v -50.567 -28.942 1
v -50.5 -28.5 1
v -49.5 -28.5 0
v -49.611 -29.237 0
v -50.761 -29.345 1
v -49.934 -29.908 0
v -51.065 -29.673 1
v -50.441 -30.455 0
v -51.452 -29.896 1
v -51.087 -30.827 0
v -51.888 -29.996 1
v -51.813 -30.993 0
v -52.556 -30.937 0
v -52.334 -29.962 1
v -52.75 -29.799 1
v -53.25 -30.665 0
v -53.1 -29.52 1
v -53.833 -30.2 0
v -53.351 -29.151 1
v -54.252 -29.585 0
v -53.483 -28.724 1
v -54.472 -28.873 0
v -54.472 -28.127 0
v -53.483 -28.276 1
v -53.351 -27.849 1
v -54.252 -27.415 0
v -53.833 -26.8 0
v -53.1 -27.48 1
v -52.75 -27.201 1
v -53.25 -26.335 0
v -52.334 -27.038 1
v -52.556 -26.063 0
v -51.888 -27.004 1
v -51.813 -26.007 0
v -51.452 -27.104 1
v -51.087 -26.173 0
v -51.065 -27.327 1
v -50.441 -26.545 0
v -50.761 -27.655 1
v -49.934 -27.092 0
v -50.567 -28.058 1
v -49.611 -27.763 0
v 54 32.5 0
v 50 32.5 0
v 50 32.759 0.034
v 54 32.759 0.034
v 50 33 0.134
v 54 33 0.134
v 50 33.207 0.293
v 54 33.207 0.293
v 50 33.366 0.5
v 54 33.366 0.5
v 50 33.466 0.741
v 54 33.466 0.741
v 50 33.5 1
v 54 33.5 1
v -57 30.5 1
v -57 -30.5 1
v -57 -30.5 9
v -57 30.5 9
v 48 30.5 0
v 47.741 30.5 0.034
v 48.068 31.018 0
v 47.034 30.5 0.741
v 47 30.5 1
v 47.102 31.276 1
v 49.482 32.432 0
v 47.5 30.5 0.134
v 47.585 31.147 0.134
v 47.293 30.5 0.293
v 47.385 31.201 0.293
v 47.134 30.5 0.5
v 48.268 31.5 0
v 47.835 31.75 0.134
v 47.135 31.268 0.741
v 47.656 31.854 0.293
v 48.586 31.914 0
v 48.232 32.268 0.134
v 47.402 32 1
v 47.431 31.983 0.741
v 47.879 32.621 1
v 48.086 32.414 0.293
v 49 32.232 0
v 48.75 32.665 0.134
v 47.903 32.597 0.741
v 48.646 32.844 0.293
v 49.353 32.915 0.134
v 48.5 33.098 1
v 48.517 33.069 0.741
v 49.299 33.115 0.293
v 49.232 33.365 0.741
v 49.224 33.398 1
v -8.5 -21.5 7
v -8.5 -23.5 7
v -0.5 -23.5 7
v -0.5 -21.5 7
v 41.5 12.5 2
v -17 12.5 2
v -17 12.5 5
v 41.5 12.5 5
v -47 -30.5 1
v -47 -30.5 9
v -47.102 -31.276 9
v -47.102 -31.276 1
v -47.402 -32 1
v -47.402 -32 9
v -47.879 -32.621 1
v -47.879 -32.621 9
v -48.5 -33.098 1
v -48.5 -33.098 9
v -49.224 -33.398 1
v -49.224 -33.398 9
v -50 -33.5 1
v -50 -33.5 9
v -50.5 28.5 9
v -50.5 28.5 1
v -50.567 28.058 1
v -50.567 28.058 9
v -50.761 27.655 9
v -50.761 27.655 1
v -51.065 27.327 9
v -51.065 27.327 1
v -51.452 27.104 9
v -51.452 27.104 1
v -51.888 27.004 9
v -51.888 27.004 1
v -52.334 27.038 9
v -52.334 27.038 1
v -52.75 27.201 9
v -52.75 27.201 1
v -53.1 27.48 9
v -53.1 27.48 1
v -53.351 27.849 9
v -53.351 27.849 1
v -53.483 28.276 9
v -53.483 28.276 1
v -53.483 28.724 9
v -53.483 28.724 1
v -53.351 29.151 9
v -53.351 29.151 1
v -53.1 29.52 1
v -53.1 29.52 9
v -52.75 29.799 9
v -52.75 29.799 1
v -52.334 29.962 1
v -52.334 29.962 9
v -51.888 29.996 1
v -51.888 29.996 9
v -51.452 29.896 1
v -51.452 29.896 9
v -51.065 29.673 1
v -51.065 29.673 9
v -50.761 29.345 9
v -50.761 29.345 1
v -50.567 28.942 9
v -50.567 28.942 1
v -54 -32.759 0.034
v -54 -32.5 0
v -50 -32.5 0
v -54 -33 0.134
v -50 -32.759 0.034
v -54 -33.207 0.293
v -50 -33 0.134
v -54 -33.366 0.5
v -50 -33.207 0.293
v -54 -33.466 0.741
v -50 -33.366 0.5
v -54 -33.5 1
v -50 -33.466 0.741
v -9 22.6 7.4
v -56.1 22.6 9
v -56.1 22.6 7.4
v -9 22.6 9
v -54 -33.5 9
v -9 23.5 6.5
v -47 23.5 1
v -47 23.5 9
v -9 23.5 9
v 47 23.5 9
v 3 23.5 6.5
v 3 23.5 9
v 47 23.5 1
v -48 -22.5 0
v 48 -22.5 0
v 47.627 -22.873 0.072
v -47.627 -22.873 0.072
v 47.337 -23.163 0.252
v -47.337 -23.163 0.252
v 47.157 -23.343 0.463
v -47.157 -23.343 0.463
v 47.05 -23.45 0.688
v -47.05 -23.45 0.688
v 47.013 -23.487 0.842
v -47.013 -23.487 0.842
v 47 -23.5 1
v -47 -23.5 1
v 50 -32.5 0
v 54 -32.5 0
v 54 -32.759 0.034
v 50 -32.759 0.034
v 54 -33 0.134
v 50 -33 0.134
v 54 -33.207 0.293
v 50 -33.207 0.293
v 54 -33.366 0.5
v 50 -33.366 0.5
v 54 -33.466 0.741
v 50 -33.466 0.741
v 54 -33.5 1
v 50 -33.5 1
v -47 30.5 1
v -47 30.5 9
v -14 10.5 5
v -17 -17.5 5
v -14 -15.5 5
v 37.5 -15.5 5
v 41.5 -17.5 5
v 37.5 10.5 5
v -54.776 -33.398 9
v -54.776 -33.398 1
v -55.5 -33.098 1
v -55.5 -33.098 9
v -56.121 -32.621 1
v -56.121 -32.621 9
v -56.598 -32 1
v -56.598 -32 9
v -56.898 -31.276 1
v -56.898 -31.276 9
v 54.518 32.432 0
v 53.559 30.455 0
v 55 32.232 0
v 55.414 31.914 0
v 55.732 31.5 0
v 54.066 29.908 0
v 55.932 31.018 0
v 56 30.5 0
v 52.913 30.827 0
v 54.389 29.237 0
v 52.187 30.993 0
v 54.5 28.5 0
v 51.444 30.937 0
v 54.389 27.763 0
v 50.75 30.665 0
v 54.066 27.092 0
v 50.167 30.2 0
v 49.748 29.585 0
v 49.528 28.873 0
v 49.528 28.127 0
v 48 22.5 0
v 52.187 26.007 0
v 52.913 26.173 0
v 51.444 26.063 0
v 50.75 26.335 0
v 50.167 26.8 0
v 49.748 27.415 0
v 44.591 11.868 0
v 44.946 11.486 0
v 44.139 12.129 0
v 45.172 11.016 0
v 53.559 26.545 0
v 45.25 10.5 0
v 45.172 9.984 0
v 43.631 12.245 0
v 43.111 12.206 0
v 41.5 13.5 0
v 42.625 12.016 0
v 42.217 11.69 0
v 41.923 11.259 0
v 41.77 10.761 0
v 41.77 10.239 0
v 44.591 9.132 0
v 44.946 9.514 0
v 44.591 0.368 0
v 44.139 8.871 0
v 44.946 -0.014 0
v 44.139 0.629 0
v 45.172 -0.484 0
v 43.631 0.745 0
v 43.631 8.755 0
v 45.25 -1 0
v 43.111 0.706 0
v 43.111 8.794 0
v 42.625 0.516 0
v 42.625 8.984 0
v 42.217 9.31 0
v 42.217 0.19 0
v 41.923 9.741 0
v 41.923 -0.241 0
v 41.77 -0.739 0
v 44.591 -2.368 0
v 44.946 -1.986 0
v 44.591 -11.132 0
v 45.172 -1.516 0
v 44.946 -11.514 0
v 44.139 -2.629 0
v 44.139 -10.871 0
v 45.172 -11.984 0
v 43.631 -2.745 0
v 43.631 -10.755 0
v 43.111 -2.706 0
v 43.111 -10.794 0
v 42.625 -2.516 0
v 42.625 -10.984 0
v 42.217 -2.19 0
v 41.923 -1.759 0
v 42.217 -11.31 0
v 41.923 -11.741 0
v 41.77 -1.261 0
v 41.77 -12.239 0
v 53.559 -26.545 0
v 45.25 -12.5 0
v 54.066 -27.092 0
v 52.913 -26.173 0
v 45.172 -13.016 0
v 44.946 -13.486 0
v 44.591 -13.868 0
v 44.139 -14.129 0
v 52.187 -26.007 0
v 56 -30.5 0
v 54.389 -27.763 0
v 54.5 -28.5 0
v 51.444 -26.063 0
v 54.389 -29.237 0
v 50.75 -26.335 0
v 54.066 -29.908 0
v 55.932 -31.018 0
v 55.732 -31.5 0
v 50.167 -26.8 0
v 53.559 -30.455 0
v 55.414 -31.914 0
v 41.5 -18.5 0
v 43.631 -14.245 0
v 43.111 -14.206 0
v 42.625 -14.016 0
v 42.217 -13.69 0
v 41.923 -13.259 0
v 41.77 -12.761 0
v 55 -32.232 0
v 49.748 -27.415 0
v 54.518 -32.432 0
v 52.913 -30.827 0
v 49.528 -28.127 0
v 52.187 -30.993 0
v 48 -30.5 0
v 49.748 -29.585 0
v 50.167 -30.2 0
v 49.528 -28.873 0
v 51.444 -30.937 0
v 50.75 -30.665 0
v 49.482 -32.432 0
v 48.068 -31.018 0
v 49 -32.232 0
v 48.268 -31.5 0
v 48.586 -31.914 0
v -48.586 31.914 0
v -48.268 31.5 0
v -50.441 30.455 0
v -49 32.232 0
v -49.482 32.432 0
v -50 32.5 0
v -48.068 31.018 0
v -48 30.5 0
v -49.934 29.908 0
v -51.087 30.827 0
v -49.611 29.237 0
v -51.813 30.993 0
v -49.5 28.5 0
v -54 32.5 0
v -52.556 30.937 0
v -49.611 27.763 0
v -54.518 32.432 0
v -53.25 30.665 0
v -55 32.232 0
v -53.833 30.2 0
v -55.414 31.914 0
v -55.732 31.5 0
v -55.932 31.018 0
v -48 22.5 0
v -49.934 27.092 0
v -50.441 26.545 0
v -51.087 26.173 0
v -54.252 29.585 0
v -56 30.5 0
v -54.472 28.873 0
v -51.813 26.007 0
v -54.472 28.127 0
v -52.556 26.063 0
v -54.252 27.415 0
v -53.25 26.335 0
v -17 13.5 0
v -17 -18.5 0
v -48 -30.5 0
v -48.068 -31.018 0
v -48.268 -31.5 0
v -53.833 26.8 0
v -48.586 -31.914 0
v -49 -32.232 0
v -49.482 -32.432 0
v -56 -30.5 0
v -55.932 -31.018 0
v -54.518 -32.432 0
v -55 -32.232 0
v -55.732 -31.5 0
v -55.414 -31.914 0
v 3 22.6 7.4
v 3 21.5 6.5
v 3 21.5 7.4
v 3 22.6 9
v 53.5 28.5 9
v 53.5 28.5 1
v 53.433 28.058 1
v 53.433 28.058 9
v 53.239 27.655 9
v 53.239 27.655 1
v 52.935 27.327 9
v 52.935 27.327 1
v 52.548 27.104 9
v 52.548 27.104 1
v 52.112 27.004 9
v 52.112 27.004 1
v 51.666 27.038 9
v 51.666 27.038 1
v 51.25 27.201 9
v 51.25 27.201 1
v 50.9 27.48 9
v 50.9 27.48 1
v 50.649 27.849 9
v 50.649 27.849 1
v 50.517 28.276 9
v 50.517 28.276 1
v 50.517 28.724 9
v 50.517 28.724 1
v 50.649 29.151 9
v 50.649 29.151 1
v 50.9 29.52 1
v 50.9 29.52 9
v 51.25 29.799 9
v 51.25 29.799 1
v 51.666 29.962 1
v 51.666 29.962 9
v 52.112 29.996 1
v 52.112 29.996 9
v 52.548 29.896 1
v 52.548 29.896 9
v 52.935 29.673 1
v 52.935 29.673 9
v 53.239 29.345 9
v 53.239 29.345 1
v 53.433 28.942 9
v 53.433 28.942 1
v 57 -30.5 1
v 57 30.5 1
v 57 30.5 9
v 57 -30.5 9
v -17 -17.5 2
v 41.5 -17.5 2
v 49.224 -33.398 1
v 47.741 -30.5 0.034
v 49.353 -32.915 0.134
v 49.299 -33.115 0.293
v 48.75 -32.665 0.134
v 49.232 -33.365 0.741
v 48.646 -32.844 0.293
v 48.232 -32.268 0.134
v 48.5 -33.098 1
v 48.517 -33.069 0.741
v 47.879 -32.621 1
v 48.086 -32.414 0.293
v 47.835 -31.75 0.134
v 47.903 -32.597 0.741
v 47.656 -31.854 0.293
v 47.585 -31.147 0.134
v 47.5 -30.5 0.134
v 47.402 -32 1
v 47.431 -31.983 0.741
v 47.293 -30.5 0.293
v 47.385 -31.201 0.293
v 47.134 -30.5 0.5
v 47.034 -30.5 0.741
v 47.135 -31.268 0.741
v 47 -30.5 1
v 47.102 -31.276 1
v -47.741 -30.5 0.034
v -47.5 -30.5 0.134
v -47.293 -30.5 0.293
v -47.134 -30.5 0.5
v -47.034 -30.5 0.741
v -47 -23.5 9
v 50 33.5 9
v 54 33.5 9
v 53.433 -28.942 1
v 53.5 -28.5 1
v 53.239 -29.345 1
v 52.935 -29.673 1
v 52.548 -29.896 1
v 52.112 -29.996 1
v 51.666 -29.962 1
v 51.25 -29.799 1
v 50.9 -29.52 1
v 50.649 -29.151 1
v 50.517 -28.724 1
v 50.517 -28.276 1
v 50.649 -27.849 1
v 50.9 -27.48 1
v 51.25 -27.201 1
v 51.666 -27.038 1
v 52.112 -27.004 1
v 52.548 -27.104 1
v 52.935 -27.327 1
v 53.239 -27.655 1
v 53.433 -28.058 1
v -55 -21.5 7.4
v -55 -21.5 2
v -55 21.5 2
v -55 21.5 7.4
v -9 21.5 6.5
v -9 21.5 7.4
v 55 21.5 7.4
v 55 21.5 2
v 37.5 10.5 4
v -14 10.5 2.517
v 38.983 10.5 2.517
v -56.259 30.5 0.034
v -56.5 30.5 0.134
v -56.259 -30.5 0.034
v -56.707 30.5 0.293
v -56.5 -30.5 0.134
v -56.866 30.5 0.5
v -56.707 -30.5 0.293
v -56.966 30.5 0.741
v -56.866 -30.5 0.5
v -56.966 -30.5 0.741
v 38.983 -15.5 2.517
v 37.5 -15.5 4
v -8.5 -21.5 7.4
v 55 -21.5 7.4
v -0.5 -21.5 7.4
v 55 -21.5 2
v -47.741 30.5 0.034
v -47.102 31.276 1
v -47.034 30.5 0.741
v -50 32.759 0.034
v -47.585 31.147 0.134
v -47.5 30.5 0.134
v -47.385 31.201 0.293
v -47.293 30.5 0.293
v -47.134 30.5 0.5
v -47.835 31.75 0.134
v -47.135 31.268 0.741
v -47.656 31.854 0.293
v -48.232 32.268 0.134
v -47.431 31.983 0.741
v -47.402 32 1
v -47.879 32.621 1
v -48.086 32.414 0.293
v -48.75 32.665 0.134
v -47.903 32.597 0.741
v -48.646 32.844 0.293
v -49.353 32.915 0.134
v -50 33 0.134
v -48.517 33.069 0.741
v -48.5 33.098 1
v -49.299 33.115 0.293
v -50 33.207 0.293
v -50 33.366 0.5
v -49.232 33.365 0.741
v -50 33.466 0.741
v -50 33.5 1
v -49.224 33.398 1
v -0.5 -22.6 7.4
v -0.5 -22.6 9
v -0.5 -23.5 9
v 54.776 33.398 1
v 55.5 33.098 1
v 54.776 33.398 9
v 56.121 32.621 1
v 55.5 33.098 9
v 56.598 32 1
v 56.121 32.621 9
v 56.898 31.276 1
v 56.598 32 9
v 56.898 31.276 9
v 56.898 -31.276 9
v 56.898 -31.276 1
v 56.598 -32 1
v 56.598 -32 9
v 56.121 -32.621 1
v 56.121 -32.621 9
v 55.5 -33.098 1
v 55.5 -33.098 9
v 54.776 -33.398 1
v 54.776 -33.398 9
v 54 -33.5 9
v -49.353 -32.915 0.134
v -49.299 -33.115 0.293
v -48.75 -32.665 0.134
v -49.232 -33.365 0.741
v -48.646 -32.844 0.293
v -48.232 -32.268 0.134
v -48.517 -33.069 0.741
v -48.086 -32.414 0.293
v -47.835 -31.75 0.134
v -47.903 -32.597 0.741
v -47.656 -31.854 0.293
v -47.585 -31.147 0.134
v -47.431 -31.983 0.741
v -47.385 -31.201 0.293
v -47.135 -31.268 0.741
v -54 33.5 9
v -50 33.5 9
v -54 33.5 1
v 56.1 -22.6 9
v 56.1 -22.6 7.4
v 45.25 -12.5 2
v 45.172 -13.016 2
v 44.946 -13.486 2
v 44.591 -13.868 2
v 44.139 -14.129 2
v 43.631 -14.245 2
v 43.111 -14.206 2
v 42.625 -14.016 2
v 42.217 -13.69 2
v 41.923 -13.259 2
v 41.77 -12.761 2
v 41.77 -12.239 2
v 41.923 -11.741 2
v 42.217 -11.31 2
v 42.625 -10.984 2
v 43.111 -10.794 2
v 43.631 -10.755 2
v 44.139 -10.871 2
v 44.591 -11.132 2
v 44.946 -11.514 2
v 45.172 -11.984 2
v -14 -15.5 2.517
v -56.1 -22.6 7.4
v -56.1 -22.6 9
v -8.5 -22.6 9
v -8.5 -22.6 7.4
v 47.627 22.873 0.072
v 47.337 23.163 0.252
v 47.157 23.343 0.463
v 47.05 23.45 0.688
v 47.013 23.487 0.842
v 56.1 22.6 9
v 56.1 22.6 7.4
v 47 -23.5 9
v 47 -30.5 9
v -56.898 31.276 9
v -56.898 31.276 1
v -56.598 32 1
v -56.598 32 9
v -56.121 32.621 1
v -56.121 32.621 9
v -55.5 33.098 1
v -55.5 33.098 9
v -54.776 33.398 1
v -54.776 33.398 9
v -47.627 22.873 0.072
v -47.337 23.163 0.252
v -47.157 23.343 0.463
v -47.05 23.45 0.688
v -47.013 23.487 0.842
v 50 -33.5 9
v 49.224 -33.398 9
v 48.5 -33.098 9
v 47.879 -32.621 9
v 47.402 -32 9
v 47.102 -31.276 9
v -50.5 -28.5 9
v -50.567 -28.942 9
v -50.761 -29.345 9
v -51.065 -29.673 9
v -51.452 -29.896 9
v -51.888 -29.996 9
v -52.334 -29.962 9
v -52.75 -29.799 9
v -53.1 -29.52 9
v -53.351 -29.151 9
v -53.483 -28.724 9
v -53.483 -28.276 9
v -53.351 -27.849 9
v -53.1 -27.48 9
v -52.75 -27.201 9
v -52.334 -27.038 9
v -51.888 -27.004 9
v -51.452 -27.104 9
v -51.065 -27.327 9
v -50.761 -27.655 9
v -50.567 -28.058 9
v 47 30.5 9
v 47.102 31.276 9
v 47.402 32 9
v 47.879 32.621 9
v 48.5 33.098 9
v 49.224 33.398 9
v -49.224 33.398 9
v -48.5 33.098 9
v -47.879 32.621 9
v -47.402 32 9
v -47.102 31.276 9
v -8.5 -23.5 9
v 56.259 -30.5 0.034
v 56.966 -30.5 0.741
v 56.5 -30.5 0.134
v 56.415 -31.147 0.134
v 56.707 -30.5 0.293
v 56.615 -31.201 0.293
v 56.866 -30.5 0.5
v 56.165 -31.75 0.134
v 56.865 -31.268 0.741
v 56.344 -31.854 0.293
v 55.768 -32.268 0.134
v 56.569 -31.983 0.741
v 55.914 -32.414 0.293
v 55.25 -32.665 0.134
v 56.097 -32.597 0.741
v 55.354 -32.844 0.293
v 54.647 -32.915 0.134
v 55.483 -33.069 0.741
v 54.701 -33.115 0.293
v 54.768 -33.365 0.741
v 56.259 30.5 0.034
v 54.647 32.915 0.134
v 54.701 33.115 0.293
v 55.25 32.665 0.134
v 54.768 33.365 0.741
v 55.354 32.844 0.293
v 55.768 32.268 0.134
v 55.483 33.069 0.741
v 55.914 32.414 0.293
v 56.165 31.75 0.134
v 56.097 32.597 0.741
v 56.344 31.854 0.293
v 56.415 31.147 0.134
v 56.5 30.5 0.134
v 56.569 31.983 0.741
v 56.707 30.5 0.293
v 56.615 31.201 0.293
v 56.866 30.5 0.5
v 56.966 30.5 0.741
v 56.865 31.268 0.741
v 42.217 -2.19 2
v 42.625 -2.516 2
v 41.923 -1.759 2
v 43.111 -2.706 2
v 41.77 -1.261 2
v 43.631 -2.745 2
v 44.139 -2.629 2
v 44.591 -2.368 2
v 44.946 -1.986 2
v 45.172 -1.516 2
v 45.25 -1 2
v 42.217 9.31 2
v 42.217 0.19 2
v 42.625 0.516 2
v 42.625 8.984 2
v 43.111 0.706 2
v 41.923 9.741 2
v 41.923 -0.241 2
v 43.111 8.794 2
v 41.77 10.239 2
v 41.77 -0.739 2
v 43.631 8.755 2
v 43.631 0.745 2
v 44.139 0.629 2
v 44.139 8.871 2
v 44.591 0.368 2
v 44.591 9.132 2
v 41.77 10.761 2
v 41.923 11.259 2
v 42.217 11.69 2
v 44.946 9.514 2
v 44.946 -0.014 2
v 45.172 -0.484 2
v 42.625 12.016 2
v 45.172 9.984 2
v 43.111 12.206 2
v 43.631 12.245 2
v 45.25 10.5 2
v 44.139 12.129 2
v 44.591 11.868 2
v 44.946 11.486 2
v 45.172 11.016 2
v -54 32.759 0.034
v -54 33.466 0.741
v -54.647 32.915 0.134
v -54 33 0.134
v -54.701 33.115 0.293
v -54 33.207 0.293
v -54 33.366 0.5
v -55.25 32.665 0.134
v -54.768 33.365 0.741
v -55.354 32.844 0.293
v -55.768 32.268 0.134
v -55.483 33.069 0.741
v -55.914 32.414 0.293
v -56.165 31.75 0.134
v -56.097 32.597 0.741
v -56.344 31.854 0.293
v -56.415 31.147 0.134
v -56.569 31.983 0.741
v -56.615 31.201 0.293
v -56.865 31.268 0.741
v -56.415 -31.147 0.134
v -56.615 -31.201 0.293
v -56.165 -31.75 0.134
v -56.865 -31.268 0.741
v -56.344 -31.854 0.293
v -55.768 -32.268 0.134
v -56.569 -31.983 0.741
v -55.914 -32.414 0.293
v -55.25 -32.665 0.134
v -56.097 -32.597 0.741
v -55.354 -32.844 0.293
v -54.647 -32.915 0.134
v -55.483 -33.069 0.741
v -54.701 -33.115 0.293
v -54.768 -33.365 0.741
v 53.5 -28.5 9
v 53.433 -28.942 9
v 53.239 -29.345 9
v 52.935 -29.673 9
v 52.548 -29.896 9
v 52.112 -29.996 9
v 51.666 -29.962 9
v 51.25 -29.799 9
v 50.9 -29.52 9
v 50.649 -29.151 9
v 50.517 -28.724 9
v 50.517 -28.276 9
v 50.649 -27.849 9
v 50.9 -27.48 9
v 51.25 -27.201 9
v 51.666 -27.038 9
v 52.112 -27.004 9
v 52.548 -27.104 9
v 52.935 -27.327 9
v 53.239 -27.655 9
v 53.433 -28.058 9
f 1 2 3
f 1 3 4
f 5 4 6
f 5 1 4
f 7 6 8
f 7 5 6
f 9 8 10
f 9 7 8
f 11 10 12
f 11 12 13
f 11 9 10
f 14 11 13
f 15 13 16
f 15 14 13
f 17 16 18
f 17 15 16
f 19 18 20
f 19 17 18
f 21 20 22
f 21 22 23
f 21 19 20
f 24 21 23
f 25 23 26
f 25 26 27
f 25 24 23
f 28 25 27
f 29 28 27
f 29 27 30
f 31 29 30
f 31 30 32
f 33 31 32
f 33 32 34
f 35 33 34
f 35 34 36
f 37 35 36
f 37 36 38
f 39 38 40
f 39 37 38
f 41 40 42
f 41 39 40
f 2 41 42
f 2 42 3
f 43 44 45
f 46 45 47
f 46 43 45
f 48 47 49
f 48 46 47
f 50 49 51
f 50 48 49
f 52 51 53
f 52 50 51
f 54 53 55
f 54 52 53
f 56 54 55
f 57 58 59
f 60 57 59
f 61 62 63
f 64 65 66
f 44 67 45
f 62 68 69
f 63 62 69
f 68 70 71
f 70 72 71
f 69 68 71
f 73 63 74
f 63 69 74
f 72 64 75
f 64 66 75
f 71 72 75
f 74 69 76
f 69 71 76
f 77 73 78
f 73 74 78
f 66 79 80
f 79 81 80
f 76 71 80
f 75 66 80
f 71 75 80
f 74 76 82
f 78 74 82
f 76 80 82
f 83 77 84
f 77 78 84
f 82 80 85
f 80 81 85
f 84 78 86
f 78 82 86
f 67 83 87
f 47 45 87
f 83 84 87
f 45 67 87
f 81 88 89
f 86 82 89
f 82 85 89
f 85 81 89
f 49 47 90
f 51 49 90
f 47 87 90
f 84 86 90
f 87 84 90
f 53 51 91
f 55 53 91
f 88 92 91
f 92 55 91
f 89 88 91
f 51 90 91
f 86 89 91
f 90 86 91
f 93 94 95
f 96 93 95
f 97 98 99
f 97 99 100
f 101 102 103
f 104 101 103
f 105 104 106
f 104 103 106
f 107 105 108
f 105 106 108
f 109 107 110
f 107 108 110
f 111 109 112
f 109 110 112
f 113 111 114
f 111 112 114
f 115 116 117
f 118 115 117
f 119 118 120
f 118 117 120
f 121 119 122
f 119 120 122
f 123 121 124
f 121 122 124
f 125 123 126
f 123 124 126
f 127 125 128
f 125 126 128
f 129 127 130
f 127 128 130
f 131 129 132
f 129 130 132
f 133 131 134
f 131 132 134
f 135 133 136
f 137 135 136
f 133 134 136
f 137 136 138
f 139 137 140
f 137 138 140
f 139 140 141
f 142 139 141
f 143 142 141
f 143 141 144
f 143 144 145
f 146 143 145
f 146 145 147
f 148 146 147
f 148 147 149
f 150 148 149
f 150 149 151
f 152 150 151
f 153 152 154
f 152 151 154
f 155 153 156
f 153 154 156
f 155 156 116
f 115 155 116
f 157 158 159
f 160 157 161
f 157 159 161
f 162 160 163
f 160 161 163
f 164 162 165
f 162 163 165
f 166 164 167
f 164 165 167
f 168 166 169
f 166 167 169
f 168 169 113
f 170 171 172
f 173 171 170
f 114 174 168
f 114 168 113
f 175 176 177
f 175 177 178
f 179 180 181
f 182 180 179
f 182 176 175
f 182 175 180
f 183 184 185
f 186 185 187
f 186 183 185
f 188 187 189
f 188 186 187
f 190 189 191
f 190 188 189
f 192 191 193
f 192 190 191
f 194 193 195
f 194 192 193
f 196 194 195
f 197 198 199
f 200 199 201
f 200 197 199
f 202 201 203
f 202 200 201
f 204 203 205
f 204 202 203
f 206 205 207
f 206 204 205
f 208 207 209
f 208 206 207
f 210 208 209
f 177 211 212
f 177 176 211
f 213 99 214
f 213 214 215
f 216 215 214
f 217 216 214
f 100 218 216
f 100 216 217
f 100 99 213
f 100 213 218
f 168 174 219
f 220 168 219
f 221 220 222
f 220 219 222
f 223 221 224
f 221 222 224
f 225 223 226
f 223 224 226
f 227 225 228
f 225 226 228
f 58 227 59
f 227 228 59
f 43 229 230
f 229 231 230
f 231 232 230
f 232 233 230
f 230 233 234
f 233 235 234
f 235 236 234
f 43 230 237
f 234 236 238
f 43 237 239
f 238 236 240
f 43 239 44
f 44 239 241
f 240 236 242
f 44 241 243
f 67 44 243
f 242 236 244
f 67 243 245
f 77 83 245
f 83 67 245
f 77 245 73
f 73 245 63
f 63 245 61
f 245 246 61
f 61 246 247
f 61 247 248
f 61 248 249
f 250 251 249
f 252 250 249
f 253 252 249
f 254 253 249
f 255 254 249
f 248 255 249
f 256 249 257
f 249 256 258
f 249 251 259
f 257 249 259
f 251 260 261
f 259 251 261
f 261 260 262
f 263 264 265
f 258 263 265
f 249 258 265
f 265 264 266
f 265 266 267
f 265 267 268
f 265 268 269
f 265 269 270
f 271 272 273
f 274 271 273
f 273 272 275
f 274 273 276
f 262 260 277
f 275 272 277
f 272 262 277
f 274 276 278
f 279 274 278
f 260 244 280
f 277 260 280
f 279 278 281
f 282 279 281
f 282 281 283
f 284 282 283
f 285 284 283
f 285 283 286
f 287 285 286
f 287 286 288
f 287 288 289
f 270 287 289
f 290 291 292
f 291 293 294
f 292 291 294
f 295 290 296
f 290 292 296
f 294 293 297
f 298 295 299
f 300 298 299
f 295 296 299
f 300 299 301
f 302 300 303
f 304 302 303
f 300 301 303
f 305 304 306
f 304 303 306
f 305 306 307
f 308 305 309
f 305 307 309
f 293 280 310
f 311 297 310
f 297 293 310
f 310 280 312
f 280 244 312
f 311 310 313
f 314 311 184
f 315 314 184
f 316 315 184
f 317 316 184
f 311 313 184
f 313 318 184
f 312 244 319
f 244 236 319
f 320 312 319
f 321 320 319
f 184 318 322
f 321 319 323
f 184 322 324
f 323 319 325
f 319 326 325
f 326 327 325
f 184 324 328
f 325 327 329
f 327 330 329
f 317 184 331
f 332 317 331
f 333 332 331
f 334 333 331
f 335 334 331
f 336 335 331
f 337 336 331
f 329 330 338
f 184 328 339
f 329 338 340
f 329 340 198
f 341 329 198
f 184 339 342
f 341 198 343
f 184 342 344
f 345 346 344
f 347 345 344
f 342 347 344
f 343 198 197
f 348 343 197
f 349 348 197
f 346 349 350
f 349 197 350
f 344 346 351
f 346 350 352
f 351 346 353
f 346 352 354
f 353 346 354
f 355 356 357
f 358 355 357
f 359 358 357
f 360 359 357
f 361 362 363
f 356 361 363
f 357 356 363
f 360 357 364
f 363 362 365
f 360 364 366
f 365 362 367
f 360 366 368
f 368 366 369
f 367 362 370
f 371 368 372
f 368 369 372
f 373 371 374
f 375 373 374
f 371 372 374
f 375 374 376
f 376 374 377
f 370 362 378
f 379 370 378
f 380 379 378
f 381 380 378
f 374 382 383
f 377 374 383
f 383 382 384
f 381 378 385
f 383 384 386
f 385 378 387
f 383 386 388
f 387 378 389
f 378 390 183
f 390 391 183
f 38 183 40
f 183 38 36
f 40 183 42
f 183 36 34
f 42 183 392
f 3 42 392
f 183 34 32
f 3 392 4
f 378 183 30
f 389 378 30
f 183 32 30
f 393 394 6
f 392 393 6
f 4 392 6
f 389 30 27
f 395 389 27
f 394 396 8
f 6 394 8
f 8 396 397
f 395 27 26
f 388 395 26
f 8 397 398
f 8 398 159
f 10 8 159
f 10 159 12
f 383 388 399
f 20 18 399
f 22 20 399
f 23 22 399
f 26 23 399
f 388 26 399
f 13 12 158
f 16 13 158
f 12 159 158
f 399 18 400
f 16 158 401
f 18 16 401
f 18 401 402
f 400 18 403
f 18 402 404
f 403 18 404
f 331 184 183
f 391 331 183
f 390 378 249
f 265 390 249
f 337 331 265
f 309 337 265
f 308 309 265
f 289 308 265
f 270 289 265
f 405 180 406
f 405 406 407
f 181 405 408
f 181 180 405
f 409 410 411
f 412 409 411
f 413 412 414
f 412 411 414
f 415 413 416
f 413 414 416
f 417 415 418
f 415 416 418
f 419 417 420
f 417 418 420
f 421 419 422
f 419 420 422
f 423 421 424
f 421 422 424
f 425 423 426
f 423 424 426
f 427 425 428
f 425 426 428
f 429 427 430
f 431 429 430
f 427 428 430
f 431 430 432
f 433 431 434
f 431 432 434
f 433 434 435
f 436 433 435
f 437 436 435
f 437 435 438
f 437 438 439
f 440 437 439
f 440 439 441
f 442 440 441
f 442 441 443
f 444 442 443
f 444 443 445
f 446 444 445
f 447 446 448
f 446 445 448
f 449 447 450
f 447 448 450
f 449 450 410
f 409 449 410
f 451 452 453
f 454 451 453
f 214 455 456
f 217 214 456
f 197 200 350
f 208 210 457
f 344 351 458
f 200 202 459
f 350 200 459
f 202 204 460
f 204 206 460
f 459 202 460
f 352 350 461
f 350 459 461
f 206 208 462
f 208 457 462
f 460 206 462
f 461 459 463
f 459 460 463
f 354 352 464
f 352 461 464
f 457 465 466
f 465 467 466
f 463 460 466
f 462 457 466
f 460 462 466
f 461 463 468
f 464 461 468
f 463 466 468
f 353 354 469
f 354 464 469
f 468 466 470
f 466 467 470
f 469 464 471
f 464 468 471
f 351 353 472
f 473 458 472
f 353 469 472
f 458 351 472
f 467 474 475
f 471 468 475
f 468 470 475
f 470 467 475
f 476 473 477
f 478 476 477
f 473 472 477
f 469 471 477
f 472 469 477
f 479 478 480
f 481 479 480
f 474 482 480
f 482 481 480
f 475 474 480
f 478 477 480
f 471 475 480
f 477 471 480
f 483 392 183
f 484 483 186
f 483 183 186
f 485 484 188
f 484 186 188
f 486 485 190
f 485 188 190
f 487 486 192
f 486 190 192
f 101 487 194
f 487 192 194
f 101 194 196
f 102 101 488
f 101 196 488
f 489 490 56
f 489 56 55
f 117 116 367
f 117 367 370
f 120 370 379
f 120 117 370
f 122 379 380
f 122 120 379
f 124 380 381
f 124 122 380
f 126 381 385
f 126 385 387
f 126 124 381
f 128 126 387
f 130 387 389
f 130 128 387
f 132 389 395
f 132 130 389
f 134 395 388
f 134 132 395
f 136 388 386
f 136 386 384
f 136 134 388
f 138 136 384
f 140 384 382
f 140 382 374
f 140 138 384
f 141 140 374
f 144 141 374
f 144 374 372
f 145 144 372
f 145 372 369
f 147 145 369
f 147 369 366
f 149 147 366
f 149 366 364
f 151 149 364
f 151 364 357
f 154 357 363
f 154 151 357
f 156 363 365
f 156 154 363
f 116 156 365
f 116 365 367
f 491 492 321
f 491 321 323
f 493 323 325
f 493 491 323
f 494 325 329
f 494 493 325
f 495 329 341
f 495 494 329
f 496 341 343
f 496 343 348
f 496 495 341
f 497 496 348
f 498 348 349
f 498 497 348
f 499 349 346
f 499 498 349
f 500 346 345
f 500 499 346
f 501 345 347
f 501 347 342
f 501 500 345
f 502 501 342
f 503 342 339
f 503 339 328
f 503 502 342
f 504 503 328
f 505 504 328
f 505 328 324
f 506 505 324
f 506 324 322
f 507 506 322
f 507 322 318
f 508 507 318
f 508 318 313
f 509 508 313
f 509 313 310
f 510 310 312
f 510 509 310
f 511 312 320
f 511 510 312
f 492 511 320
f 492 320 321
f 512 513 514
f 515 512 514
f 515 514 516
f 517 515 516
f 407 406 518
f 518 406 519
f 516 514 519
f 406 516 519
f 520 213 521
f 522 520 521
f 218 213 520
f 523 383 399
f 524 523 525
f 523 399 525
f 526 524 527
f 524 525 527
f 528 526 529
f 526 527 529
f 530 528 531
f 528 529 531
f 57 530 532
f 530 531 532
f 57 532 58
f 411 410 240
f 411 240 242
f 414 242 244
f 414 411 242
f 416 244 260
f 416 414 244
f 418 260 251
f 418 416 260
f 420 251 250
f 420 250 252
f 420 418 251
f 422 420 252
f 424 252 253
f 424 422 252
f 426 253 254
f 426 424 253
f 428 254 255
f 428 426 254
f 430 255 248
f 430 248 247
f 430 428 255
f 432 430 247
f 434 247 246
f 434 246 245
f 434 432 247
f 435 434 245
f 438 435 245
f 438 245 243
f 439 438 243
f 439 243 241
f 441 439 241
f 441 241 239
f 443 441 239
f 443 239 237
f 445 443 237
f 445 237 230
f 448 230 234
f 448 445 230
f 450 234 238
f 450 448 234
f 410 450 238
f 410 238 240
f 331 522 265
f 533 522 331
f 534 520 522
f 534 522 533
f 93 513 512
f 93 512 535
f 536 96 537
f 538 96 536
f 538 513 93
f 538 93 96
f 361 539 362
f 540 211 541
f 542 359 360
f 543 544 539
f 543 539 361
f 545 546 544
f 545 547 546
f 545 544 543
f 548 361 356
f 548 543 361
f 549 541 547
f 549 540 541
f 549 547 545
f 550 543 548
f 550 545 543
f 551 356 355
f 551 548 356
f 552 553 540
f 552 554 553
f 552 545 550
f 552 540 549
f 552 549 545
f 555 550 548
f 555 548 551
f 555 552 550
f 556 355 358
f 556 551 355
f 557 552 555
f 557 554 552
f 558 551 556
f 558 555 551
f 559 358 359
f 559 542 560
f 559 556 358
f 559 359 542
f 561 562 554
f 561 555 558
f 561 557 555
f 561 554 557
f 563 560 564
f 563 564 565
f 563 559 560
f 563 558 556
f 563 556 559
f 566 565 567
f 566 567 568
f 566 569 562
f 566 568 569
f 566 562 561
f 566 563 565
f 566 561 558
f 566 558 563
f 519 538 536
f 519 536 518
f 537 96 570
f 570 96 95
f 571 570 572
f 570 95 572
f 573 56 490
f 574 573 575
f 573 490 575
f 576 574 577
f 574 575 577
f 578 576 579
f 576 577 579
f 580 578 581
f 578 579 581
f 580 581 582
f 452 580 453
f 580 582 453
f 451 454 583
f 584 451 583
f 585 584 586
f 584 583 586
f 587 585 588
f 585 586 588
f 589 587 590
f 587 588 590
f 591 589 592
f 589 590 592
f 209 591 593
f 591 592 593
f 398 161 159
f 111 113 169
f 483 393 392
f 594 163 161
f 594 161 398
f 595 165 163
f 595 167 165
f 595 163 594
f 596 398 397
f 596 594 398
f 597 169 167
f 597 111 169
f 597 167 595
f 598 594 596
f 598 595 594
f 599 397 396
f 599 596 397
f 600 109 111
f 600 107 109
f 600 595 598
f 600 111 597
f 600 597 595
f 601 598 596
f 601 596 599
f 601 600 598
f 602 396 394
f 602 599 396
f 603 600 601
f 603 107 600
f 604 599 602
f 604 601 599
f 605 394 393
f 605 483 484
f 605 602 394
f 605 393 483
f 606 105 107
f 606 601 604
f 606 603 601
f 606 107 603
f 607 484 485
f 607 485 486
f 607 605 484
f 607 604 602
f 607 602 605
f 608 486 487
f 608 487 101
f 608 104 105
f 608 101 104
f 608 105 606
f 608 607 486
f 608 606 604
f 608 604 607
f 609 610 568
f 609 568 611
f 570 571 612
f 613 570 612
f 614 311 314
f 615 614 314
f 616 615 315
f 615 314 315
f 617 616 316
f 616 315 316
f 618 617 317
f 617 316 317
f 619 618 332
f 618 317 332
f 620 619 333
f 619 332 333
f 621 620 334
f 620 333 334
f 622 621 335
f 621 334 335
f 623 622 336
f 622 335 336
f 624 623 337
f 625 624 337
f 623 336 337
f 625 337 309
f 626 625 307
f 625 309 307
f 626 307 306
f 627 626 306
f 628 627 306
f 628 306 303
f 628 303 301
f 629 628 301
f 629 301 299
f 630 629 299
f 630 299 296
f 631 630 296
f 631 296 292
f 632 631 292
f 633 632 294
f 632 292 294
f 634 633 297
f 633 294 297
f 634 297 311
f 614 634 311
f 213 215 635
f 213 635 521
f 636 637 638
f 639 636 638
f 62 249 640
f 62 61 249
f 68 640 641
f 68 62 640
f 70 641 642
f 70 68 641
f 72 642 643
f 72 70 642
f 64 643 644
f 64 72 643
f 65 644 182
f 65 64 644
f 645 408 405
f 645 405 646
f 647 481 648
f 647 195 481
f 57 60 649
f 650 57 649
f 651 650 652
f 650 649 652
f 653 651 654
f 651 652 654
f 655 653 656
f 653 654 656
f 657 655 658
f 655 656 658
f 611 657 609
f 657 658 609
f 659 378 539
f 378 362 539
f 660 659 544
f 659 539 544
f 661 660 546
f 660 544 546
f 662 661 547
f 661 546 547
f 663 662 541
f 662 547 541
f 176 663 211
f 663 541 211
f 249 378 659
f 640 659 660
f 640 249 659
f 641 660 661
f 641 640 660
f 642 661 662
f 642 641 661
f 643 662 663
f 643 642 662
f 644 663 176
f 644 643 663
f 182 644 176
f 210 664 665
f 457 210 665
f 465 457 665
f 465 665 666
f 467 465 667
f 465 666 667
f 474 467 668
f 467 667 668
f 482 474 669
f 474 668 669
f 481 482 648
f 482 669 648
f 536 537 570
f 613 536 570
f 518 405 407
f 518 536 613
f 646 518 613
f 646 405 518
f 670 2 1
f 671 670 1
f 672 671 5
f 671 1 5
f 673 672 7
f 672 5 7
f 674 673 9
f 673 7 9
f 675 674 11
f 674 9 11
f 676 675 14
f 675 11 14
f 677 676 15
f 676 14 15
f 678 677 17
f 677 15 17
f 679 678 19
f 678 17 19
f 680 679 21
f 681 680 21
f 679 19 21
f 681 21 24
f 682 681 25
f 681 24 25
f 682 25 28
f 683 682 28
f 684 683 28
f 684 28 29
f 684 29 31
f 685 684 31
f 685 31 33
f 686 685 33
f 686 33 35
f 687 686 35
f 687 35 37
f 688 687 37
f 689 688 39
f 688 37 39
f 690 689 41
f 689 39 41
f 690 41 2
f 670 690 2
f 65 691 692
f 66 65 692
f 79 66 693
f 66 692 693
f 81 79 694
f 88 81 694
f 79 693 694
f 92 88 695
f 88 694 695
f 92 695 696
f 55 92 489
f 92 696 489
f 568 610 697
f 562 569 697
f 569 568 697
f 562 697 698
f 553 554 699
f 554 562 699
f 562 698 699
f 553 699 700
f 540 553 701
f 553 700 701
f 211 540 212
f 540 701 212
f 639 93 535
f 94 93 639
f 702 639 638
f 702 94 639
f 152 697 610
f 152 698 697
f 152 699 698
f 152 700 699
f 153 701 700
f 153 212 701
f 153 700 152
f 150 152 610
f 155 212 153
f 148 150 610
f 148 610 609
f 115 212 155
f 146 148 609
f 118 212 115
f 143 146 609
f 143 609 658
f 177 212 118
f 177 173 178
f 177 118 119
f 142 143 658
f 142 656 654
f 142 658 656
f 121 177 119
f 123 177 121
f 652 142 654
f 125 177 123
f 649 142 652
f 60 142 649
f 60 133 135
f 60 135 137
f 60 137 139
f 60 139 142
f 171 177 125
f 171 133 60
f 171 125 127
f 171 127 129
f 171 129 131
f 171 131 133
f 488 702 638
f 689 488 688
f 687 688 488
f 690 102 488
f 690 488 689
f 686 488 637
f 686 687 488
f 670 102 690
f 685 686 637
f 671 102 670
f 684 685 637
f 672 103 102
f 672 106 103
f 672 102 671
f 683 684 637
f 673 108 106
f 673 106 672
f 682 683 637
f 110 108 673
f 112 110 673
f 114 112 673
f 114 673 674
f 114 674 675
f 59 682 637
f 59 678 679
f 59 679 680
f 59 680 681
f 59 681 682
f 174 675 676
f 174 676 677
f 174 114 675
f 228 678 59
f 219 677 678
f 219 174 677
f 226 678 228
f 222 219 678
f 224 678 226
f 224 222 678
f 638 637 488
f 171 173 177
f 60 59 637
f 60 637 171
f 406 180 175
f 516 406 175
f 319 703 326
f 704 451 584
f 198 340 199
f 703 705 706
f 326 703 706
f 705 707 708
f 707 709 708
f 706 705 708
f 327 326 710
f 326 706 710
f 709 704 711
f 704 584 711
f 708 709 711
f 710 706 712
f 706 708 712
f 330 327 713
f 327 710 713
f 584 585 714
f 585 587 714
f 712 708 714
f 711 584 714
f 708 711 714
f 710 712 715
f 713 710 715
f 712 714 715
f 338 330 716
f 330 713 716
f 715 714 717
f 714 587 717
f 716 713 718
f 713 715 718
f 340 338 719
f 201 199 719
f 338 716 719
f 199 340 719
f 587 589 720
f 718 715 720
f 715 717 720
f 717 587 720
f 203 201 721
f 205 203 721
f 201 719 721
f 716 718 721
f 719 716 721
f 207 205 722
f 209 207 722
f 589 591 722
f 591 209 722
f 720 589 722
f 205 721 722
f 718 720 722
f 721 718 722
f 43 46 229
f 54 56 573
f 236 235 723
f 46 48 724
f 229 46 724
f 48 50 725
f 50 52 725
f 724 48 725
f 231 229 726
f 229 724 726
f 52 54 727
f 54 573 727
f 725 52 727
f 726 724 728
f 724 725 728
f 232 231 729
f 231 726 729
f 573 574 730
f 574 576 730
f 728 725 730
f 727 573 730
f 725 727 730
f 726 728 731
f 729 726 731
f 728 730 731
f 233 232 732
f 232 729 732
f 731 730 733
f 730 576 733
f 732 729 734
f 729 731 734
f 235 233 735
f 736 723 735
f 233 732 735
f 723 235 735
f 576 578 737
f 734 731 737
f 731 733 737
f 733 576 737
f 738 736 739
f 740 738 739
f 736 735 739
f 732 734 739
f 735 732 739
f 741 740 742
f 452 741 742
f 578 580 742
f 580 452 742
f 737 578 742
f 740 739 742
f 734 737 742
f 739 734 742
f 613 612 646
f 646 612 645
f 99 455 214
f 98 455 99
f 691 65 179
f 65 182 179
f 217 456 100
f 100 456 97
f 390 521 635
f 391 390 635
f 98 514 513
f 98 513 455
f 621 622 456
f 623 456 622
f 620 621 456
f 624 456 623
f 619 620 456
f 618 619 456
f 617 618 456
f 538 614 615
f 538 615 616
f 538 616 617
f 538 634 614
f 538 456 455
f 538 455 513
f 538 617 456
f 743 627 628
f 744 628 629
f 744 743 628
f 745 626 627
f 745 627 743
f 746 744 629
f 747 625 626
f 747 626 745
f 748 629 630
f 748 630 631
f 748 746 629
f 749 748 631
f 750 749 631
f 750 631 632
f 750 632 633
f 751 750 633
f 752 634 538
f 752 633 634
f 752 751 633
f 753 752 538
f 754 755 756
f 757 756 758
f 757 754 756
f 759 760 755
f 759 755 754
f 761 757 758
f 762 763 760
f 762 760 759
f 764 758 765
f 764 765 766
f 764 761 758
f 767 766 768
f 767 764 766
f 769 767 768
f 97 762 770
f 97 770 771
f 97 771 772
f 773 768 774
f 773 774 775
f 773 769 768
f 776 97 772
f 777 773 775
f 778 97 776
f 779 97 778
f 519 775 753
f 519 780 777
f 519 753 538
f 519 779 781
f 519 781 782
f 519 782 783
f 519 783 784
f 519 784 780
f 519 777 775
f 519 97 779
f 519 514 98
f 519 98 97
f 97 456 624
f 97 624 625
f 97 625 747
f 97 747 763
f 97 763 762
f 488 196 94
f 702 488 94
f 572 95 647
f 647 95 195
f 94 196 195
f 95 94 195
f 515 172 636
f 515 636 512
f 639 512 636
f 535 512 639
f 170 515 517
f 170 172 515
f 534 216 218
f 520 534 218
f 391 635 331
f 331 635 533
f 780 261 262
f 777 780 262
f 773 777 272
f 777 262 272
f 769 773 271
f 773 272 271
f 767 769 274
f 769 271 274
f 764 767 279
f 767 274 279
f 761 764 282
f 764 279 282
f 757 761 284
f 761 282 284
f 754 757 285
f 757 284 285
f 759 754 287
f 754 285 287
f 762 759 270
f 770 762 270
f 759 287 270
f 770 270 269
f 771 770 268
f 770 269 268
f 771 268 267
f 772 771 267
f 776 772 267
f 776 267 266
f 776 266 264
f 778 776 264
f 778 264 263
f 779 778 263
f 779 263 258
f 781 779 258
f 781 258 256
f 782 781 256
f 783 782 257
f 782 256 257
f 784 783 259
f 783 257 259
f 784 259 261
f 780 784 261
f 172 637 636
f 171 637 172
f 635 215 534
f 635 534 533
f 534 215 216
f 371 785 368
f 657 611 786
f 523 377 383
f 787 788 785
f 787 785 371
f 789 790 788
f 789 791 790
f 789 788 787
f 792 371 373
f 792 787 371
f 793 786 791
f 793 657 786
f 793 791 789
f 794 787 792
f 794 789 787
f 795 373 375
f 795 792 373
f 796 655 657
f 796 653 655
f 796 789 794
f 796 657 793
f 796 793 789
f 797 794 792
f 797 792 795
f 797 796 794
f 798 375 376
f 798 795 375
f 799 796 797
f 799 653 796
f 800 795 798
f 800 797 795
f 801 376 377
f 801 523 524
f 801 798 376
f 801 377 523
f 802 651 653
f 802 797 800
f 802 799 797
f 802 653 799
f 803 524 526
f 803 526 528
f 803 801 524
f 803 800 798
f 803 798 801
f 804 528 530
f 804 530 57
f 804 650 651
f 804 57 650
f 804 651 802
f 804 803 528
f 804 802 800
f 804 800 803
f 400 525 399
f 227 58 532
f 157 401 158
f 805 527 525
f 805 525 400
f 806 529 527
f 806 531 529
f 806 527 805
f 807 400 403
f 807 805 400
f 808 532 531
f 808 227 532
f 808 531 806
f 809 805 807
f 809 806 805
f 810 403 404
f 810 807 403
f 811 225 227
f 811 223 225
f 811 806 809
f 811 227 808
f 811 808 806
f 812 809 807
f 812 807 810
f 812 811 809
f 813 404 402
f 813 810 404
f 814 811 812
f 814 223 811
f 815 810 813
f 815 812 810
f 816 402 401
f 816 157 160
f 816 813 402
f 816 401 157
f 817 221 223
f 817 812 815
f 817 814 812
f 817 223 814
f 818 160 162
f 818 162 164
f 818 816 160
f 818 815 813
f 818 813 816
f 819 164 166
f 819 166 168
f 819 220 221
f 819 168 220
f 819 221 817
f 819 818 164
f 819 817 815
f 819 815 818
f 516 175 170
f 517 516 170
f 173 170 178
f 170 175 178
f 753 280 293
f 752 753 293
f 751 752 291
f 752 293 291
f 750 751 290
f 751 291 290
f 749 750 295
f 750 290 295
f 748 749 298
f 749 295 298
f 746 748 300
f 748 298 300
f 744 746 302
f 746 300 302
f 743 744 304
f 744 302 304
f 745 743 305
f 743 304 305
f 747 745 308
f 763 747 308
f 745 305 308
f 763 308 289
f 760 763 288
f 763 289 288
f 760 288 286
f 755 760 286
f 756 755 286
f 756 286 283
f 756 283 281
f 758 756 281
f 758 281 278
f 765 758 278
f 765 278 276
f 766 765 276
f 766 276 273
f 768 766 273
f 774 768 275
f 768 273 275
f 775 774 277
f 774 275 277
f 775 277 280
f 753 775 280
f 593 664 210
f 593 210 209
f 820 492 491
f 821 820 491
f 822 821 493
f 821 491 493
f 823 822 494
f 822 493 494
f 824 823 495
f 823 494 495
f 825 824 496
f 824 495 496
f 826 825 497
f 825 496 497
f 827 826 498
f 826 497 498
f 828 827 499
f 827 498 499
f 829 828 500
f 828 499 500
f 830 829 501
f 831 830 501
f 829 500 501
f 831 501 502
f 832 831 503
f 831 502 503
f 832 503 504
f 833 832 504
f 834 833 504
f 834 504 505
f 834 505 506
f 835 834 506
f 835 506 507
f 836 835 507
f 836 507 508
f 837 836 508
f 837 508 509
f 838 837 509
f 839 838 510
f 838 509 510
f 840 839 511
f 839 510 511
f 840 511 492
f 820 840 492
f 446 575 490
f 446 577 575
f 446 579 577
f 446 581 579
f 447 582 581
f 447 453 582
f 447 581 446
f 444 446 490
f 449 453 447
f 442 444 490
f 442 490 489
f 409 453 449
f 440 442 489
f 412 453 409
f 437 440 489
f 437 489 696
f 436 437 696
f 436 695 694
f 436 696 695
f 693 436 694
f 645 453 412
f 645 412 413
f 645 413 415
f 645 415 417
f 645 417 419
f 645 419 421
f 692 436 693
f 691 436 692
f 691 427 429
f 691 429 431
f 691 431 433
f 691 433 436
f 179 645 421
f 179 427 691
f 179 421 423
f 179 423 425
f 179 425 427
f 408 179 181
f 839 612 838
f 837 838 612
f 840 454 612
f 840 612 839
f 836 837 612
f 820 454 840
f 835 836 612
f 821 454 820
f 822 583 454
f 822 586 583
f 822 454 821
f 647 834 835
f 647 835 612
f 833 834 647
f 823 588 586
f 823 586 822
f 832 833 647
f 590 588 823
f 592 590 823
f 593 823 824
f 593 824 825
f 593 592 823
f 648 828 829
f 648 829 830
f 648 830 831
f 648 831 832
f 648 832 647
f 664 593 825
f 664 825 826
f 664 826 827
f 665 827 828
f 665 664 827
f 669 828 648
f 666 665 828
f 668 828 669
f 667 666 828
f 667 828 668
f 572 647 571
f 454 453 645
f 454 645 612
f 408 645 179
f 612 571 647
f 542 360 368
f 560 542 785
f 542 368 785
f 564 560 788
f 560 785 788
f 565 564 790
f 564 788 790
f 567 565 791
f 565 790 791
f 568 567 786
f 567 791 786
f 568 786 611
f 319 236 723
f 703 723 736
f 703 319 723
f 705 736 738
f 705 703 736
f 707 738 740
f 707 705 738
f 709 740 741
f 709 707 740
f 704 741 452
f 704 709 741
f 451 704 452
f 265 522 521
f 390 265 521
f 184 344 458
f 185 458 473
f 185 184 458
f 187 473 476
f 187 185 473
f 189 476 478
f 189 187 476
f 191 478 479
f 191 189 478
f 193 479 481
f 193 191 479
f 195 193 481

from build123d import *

# Parameters (mm, degrees)
SKETCH_W         = 114
SKETCH_H         = 47
PAD_DEPTH        = 9
THICKNESS_T      = -2
SKETCH004_W      = 10
SKETCH004_H      = 9
PAD001_DEPTH     = 10
SKETCH005_W      = 10
SKETCH005_H      = 9
PAD002_DEPTH     = 10
SKETCH006_W      = 112.2
SKETCH006_H      = 45.2
POCKET_DEPTH     = 1.6
SKETCH007_R      = 1.5
POCKET001_DEPTH  = 9
SKETCH008_W      = 51.5
SKETCH008_H      = 26
POCKET002_DEPTH  = 7
SKETCH009_W      = 58.5
SKETCH009_H      = 30
PAD003_DEPTH     = 3
SKETCH010_W      = 51.5
SKETCH010_H      = 26
POCKET003_DEPTH  = 3
SKETCH011_R      = 1.75
POCKET004_DEPTH  = 2
CHAMFER_SIZE     = 1
CHAMFER001_ANGLE = 45
CHAMFER001_SIZE  = 4
CHAMFER002_ANGLE = 40
CHAMFER002_SIZE  = 3
FILLET_R         = 3
FILLET001_R      = 3
FILLET002_R      = 1
FILLET003_R      = 1
FILLET004_R      = 1
SKETCH012_W      = 12
SKETCH012_H      = 2.5
POCKET005_DEPTH  = 2
SKETCH013_W      = 8
SKETCH013_H      = 2
POCKET006_DEPTH  = 2


with BuildPart() as part:
    # Sketch → Pad (new body)
    with BuildSketch(Plane.XY):
        Rectangle(SKETCH_W, SKETCH_H)
    extrude(amount=PAD_DEPTH)

    # Thickness
    thickness_openings = [part.faces().sort_by_distance(p)[0] for p in [
        (0, 0, 9),
    ]]
    offset(amount=THICKNESS_T, openings=thickness_openings)

    # Sketch004 → Pad001 (join)
    with BuildSketch(Plane.XZ.offset(23.5)):
        with Locations((-52, 4.5)):
            Rectangle(SKETCH004_W, SKETCH004_H)
        with Locations((52, 4.5)):
            Rectangle(SKETCH004_W, SKETCH004_H)
    extrude(amount=PAD001_DEPTH)

    # Sketch005 (on Face1 of Pad001) → Pad002 (join)
    with BuildSketch(Plane(origin=(0, 23.5, 0), x_dir=(-1, 0, 0), z_dir=(0, 1, 0))):
        with Locations((-52, 4.5)):
            Rectangle(SKETCH005_W, SKETCH005_H)
        with Locations((52, 4.5)):
            Rectangle(SKETCH005_W, SKETCH005_H)
    extrude(amount=PAD002_DEPTH)

    # Sketch006 (on Face12 of Pad002) → Pocket (cut)
    with BuildSketch(Plane.XY.offset(9)):
        Rectangle(SKETCH006_W, SKETCH006_H)
    extrude(amount=-POCKET_DEPTH, mode=Mode.SUBTRACT)

    # Sketch007 (on Face2 of Pocket) → Pocket001 (cut)
    with BuildSketch(Plane(origin=(0, 0, 0), x_dir=(1, 0, 0), z_dir=(0, 0, -1))):
        with Locations((-52, 28.5)):
            Circle(SKETCH007_R)
        with Locations((52, 28.5)):
            Circle(SKETCH007_R)
        with Locations((52, -28.5)):
            Circle(SKETCH007_R)
        with Locations((-52, -28.5)):
            Circle(SKETCH007_R)
    extrude(amount=-POCKET001_DEPTH, mode=Mode.SUBTRACT)

    # Sketch008 (on Face2 of Pocket001) → Pocket002 (cut)
    with BuildSketch(Plane(origin=(0, 0, 0), x_dir=(1, 0, 0), z_dir=(0, 0, -1))):
        with Locations((11.75, 2.5)):
            Rectangle(SKETCH008_W, SKETCH008_H)
    extrude(amount=-POCKET002_DEPTH, mode=Mode.SUBTRACT)

    # Sketch009 (on Face27 of Pocket002) → Pad003 (join)
    with BuildSketch(Plane.XY.offset(2)):
        with Locations((12.25, -2.5)):
            Rectangle(SKETCH009_W, SKETCH009_H)
    extrude(amount=PAD003_DEPTH)

    # Sketch010 (on Face38 of Pad003) → Pocket003 (cut)
    with BuildSketch(Plane.XY.offset(5)):
        with Locations((11.75, -2.5)):
            Rectangle(SKETCH010_W, SKETCH010_H)
    extrude(amount=-POCKET003_DEPTH, mode=Mode.SUBTRACT)

    # Sketch011 (on Face2 of Pocket003) → Pocket004 (cut)
    with BuildSketch(Plane(origin=(0, 0, 0), x_dir=(1, 0, 0), z_dir=(0, 0, -1))):
        with Locations((43.5, -10.5)):
            Circle(SKETCH011_R)
        with Locations((43.5, 1)):
            Circle(SKETCH011_R)
        with Locations((43.5, 12.5)):
            Circle(SKETCH011_R)
    extrude(amount=-POCKET004_DEPTH, mode=Mode.SUBTRACT)

    # Chamfer
    chamfer_edges = [part.edges().sort_by_distance(p)[0] for p in [
        (50.5, 28.5, 0),
        (50.5, -28.5, 0),
        (-53.5, -28.5, 0),
        (-53.5, 28.5, 0),
    ]]
    chamfer(chamfer_edges, length=CHAMFER_SIZE)

    # Chamfer001
    chamfer001_edges = [part.edges().sort_by_distance(p)[0] for p in [
        (37.5, -2.5, 0),
    ]]
    chamfer001_side = part.faces().sort_by_distance((48.177691, 28.5, 0))[0]
    chamfer(chamfer001_edges, length=CHAMFER001_SIZE, angle=CHAMFER001_ANGLE, reference=chamfer001_side)

    # Chamfer002
    chamfer002_edges = [part.edges().sort_by_distance(p)[0] for p in [
        (11.75, -15.5, 0),
        (-14, -2.5, 0),
        (11.75, 10.5, 0),
    ]]
    chamfer002_side = part.faces().sort_by_distance((39.5, 11.822309, 0))[0]
    chamfer(chamfer002_edges, length=CHAMFER002_SIZE, angle=CHAMFER002_ANGLE, reference=chamfer002_side)

    # Fillet
    fillet_edges = [part.edges().sort_by_distance(p)[0] for p in [
        (57, -33.5, 4.5),
        (47, -33.5, 4.5),
        (-47, -33.5, 4.5),
        (-57, -33.5, 4.5),
    ]]
    fillet(fillet_edges, radius=FILLET_R)

    # Fillet001
    fillet001_edges = [part.edges().sort_by_distance(p)[0] for p in [
        (-57, 33.5, 4.5),
        (-47, 33.5, 4.5),
        (47, 33.5, 4.5),
        (57, 33.5, 4.5),
    ]]
    fillet(fillet001_edges, radius=FILLET001_R)

    # Fillet002
    fillet002_edges = [part.edges().sort_by_distance(p)[0] for p in [
        (-47, 27, 0),
        (-47, -27, 0),
        (-57, 0, 0),
    ]]
    fillet(fillet002_edges, radius=FILLET002_R)

    # Fillet003
    fillet003_edges = [part.edges().sort_by_distance(p)[0] for p in [
        (47, 27, 0),
        (57, 0, 0),
        (47, -27, 0),
    ]]
    fillet(fillet003_edges, radius=FILLET003_R)

    # Fillet004
    fillet004_edges = [part.edges().sort_by_distance(p)[0] for p in [
        (0, 23.5, 0),
        (0, -23.5, 0),
    ]]
    fillet(fillet004_edges, radius=FILLET004_R)

    # Sketch012 (on Face33 of Fillet004) → Pocket005 (cut)
    with BuildSketch(Plane(origin=(0, 23.5, 0), x_dir=(-1, 0, 0), z_dir=(0, 1, 0))):
        with Locations((3, 7.75)):
            Rectangle(SKETCH012_W, SKETCH012_H)
    extrude(amount=-POCKET005_DEPTH, mode=Mode.SUBTRACT)

    # Sketch013 (on Face49 of Pocket005) → Pocket006 (cut)
    with BuildSketch(Plane.XZ.offset(23.5)):
        with Locations((-4.5, 8)):
            Rectangle(SKETCH013_W, SKETCH013_H)
    extrude(amount=-POCKET006_DEPTH, mode=Mode.SUBTRACT)


solid = part.part
